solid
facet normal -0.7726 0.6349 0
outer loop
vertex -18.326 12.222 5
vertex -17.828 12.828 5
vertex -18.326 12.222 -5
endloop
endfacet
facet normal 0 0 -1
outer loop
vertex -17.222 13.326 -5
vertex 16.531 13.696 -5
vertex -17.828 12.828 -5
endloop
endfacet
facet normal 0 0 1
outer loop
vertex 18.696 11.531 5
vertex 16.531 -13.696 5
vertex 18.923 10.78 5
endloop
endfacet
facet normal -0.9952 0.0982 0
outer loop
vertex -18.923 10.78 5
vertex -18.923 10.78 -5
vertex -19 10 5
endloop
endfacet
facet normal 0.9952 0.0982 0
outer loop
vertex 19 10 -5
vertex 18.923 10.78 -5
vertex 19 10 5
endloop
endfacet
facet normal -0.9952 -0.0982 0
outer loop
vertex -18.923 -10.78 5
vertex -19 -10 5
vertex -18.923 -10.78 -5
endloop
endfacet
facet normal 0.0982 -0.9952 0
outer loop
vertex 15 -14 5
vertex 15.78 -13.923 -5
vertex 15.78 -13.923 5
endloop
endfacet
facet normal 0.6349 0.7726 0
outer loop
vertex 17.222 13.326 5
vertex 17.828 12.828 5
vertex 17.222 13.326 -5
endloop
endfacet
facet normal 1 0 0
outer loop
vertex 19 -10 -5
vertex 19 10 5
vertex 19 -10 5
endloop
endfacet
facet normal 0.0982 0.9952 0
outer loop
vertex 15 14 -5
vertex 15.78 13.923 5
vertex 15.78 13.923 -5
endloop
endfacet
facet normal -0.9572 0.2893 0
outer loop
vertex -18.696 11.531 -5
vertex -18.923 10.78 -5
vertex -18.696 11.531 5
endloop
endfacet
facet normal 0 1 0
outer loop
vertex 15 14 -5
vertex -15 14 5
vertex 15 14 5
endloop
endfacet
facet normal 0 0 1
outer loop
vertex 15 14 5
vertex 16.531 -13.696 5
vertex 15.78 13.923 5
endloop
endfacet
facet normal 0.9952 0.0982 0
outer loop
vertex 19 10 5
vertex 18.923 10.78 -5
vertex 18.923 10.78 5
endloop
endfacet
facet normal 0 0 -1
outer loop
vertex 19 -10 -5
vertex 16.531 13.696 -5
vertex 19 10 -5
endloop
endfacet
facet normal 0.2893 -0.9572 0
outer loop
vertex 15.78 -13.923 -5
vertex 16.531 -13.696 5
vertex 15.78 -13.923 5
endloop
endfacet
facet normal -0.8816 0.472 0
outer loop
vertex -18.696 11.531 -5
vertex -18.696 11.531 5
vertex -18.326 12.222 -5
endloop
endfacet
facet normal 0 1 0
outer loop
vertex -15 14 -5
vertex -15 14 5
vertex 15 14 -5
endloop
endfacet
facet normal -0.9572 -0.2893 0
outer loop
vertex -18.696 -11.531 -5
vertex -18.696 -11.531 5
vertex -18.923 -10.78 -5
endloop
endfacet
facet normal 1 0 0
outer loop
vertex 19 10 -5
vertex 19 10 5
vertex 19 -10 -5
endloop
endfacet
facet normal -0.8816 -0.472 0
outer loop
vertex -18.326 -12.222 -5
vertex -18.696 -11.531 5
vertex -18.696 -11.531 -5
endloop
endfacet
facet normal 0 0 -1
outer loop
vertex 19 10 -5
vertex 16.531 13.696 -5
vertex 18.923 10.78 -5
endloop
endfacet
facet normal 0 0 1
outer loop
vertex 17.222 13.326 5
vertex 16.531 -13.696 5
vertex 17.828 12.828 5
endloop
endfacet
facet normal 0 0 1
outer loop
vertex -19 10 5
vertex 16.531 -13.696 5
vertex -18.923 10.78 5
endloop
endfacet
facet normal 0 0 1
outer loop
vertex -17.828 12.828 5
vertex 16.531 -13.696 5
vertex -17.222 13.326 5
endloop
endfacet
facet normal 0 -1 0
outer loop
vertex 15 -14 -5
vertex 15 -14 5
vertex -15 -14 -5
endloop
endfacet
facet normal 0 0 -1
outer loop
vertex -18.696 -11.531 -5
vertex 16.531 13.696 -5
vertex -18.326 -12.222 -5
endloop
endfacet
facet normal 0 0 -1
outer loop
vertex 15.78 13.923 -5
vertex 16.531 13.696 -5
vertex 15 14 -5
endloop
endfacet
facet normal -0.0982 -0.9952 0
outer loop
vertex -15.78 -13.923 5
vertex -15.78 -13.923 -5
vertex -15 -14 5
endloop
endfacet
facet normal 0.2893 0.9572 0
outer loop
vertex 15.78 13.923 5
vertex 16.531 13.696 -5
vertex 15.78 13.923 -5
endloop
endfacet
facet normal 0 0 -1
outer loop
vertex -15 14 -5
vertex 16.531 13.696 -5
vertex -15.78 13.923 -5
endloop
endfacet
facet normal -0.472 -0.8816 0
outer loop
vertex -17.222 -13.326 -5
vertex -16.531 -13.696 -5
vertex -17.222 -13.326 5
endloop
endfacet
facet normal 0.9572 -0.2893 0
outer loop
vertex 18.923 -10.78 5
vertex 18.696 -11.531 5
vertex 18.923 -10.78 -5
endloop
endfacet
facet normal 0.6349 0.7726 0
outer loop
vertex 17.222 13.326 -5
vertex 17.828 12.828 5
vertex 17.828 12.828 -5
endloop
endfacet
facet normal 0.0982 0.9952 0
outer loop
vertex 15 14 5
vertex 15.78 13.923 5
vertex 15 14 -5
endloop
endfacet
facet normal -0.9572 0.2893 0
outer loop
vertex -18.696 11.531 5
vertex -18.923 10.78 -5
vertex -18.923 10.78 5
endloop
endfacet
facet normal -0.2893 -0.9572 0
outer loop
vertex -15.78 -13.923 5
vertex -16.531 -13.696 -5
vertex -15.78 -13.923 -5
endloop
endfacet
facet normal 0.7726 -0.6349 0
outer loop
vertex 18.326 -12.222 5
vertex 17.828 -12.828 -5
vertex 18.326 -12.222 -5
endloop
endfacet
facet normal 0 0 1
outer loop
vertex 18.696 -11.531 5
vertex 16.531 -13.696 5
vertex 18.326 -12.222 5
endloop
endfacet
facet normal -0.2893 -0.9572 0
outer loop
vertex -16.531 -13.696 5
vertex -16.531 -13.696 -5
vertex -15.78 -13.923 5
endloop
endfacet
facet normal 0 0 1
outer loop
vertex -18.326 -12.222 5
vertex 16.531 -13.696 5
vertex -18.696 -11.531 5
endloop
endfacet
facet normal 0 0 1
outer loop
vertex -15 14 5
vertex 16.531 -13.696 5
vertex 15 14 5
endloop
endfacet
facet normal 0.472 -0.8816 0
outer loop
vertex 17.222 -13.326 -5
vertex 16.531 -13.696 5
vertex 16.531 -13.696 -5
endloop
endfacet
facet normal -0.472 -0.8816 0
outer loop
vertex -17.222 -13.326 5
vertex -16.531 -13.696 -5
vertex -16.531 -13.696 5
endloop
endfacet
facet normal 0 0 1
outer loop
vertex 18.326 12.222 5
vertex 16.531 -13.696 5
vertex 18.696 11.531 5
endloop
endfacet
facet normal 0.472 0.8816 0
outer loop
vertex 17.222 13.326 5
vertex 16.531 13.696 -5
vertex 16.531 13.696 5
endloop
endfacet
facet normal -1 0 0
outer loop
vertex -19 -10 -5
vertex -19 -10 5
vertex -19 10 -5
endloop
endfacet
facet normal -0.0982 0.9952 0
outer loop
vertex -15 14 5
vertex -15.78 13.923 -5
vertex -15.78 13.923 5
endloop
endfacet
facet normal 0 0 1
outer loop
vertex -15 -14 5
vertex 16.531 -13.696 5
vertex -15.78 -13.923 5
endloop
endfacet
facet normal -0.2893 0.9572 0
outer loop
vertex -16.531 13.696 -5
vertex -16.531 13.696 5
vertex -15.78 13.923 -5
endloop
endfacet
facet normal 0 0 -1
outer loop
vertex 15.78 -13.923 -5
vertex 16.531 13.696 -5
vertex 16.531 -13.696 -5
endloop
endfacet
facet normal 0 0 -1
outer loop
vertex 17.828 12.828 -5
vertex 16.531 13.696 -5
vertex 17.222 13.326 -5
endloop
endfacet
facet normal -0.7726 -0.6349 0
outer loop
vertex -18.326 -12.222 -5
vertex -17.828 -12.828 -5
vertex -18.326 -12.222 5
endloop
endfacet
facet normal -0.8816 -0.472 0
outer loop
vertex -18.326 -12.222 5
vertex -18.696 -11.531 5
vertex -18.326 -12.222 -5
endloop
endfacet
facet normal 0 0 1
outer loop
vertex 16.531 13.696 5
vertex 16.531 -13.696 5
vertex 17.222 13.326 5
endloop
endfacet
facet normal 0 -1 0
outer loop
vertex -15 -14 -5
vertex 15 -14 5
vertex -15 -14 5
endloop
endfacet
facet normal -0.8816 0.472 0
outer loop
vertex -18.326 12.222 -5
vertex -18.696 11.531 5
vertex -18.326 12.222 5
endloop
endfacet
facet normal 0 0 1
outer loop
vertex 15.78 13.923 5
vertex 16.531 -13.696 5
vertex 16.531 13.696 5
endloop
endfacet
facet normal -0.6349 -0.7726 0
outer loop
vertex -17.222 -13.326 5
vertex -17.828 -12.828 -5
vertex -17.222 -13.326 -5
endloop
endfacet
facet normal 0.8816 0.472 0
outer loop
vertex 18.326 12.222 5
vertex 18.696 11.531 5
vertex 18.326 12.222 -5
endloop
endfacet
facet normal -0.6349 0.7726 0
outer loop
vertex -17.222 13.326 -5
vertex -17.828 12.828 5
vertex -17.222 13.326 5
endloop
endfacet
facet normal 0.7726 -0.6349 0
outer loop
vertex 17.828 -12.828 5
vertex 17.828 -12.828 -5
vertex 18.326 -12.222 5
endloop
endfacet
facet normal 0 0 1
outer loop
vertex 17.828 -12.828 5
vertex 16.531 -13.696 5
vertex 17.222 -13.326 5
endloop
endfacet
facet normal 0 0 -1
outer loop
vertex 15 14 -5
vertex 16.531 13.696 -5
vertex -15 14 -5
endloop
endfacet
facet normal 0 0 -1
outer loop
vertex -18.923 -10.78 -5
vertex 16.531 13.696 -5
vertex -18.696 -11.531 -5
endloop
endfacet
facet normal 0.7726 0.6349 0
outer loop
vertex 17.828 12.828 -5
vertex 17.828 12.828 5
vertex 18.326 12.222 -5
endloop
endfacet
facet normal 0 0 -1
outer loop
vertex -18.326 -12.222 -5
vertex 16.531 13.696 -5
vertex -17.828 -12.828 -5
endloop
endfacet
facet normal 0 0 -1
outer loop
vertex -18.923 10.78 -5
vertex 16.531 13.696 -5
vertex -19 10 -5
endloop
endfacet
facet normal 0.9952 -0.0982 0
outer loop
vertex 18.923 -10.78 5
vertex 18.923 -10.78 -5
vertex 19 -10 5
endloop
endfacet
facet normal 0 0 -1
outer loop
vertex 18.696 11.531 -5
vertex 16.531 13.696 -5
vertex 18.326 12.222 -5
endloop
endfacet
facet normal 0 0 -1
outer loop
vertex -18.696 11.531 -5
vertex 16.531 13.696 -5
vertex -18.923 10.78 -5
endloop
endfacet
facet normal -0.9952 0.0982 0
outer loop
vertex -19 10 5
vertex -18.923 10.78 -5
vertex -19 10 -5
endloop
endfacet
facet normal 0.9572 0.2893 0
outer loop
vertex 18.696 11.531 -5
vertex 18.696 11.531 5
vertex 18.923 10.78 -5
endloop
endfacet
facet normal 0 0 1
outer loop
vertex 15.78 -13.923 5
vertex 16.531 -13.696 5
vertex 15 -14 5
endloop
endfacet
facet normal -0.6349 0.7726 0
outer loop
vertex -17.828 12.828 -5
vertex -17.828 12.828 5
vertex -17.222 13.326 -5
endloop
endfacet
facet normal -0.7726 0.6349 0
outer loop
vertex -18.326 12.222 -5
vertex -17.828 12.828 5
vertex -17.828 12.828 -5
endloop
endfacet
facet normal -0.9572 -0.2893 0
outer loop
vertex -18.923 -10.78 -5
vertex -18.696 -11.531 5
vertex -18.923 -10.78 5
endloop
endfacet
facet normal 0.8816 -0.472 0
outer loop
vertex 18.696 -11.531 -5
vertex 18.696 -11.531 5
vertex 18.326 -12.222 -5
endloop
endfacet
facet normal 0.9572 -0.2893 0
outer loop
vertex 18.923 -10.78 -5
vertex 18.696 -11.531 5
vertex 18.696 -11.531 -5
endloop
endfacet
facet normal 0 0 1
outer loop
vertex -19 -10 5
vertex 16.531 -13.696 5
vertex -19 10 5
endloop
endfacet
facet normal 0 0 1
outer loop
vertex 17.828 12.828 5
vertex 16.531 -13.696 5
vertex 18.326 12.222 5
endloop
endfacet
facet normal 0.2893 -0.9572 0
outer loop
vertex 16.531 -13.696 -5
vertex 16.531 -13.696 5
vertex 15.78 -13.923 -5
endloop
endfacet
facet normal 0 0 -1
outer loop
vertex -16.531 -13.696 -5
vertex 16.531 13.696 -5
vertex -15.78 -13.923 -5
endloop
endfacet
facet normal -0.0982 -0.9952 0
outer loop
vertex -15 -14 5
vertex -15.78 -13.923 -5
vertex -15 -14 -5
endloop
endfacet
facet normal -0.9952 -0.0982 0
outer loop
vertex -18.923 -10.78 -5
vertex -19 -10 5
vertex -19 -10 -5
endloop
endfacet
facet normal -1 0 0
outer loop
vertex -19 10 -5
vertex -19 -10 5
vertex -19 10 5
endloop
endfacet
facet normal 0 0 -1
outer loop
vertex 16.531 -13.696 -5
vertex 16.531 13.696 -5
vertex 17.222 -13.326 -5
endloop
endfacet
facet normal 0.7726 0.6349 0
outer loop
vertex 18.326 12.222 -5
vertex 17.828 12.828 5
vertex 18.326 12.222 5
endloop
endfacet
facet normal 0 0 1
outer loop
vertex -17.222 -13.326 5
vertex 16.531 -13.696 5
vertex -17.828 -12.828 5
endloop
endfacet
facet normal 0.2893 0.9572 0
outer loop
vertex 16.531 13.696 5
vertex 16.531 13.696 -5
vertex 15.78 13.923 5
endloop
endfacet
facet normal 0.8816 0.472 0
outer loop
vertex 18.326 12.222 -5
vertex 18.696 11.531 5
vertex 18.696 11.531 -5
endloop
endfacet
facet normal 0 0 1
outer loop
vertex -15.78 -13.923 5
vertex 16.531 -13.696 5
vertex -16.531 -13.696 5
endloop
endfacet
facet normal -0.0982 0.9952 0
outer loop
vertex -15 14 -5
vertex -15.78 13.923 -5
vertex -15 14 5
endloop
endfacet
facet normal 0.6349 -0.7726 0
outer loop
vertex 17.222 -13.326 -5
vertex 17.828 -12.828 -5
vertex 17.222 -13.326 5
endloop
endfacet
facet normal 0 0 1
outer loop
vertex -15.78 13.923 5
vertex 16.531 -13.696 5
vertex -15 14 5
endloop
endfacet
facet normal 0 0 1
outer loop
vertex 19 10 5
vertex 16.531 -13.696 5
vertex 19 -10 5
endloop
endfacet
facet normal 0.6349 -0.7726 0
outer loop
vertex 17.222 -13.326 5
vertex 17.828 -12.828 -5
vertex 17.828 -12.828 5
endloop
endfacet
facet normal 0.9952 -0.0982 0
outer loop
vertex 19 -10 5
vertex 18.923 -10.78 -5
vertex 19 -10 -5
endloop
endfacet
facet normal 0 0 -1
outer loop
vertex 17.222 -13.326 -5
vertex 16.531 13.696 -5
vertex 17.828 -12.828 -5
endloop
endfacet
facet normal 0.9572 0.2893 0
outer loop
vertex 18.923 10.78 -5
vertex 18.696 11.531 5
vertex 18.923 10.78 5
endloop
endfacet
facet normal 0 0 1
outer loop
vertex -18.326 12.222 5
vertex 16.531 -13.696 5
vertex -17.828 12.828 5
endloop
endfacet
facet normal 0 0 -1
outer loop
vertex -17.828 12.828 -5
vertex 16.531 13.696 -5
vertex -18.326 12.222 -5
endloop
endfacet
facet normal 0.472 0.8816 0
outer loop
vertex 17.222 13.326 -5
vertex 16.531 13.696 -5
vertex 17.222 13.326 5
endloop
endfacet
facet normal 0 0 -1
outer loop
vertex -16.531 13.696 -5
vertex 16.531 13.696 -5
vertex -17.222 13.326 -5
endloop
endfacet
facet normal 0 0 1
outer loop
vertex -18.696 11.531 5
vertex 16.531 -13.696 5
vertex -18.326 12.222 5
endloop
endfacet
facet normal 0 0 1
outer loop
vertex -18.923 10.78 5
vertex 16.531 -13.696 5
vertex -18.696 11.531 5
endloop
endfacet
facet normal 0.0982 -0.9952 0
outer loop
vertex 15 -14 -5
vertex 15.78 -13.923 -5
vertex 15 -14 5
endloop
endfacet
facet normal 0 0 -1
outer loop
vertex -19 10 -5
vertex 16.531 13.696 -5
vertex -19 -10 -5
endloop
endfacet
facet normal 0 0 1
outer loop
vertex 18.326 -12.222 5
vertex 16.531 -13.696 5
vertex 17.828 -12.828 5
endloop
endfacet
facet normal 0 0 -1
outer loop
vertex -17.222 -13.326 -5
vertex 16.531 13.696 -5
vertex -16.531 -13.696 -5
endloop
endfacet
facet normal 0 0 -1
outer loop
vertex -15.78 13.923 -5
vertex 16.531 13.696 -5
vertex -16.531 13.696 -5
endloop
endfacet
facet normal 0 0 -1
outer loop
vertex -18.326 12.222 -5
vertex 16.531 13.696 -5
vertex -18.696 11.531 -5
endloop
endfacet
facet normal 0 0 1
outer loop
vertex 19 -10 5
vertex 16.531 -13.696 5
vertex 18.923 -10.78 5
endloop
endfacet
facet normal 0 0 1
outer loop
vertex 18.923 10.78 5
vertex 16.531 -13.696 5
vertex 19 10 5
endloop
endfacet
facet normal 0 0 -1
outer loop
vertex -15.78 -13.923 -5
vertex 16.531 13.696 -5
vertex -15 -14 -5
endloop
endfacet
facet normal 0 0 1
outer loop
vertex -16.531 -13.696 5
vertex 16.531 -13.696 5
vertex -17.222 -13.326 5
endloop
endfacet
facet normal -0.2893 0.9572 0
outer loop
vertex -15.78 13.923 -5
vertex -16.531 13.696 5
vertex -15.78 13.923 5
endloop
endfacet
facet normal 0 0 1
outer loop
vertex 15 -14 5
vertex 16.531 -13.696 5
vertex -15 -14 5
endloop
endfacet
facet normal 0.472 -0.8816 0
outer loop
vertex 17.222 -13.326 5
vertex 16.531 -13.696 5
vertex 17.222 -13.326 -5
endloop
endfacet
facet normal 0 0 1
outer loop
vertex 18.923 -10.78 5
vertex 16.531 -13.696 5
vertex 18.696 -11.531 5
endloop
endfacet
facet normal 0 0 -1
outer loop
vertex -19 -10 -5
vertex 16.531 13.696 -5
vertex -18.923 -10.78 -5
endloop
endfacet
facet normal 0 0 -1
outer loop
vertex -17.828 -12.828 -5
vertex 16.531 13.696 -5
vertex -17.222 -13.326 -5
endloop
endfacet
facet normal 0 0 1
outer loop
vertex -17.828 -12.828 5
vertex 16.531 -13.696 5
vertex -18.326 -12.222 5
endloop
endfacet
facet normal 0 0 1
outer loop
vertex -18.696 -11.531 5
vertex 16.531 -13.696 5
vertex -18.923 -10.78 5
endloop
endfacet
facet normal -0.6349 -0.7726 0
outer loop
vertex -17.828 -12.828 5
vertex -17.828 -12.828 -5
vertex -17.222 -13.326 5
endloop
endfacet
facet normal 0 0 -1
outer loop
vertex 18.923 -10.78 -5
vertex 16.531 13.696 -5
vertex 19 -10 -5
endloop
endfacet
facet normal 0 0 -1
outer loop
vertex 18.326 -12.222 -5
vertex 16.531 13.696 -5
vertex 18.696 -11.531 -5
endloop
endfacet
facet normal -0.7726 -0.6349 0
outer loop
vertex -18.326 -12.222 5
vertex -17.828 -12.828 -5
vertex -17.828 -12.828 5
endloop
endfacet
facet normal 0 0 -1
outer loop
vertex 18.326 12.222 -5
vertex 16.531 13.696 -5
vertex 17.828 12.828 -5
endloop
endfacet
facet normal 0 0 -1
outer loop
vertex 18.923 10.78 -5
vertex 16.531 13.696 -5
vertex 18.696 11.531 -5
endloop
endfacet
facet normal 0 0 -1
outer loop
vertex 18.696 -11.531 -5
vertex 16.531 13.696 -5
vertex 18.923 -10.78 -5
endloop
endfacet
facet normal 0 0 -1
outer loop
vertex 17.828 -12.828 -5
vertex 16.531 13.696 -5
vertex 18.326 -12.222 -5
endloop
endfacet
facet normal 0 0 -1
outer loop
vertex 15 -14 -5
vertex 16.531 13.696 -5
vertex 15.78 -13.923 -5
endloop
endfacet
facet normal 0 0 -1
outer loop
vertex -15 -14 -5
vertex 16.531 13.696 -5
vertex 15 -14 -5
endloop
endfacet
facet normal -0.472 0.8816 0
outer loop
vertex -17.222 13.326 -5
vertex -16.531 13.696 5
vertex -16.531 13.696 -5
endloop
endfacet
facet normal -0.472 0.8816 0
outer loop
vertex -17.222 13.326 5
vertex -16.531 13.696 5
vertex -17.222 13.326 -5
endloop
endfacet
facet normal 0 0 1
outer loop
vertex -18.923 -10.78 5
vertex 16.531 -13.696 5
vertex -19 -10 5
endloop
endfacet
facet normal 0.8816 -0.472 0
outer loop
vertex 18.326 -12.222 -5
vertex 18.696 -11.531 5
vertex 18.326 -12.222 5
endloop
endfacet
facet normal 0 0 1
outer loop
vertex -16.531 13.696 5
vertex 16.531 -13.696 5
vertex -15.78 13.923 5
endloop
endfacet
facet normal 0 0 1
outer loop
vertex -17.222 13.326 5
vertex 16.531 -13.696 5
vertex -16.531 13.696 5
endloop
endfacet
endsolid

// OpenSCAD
// =============================================================================
// test_hull_four_cylinders.scad
//
// Hull of 4 cylinders in a rectangular pattern.
// Pattern from: gears.scad, lib_actuator_assembly_tools.scad
// Expected: a rounded rectangular prism (Minkowski sum of rectangle + circle).
// =============================================================================

$fn = 32;

hull() {
    for (x = [-15, 15]) {
        for (y = [-10, 10]) {
            translate([x, y, 0]) {
                cylinder(r = 4, h = 10, center = true);
            }
        }
    }
}
